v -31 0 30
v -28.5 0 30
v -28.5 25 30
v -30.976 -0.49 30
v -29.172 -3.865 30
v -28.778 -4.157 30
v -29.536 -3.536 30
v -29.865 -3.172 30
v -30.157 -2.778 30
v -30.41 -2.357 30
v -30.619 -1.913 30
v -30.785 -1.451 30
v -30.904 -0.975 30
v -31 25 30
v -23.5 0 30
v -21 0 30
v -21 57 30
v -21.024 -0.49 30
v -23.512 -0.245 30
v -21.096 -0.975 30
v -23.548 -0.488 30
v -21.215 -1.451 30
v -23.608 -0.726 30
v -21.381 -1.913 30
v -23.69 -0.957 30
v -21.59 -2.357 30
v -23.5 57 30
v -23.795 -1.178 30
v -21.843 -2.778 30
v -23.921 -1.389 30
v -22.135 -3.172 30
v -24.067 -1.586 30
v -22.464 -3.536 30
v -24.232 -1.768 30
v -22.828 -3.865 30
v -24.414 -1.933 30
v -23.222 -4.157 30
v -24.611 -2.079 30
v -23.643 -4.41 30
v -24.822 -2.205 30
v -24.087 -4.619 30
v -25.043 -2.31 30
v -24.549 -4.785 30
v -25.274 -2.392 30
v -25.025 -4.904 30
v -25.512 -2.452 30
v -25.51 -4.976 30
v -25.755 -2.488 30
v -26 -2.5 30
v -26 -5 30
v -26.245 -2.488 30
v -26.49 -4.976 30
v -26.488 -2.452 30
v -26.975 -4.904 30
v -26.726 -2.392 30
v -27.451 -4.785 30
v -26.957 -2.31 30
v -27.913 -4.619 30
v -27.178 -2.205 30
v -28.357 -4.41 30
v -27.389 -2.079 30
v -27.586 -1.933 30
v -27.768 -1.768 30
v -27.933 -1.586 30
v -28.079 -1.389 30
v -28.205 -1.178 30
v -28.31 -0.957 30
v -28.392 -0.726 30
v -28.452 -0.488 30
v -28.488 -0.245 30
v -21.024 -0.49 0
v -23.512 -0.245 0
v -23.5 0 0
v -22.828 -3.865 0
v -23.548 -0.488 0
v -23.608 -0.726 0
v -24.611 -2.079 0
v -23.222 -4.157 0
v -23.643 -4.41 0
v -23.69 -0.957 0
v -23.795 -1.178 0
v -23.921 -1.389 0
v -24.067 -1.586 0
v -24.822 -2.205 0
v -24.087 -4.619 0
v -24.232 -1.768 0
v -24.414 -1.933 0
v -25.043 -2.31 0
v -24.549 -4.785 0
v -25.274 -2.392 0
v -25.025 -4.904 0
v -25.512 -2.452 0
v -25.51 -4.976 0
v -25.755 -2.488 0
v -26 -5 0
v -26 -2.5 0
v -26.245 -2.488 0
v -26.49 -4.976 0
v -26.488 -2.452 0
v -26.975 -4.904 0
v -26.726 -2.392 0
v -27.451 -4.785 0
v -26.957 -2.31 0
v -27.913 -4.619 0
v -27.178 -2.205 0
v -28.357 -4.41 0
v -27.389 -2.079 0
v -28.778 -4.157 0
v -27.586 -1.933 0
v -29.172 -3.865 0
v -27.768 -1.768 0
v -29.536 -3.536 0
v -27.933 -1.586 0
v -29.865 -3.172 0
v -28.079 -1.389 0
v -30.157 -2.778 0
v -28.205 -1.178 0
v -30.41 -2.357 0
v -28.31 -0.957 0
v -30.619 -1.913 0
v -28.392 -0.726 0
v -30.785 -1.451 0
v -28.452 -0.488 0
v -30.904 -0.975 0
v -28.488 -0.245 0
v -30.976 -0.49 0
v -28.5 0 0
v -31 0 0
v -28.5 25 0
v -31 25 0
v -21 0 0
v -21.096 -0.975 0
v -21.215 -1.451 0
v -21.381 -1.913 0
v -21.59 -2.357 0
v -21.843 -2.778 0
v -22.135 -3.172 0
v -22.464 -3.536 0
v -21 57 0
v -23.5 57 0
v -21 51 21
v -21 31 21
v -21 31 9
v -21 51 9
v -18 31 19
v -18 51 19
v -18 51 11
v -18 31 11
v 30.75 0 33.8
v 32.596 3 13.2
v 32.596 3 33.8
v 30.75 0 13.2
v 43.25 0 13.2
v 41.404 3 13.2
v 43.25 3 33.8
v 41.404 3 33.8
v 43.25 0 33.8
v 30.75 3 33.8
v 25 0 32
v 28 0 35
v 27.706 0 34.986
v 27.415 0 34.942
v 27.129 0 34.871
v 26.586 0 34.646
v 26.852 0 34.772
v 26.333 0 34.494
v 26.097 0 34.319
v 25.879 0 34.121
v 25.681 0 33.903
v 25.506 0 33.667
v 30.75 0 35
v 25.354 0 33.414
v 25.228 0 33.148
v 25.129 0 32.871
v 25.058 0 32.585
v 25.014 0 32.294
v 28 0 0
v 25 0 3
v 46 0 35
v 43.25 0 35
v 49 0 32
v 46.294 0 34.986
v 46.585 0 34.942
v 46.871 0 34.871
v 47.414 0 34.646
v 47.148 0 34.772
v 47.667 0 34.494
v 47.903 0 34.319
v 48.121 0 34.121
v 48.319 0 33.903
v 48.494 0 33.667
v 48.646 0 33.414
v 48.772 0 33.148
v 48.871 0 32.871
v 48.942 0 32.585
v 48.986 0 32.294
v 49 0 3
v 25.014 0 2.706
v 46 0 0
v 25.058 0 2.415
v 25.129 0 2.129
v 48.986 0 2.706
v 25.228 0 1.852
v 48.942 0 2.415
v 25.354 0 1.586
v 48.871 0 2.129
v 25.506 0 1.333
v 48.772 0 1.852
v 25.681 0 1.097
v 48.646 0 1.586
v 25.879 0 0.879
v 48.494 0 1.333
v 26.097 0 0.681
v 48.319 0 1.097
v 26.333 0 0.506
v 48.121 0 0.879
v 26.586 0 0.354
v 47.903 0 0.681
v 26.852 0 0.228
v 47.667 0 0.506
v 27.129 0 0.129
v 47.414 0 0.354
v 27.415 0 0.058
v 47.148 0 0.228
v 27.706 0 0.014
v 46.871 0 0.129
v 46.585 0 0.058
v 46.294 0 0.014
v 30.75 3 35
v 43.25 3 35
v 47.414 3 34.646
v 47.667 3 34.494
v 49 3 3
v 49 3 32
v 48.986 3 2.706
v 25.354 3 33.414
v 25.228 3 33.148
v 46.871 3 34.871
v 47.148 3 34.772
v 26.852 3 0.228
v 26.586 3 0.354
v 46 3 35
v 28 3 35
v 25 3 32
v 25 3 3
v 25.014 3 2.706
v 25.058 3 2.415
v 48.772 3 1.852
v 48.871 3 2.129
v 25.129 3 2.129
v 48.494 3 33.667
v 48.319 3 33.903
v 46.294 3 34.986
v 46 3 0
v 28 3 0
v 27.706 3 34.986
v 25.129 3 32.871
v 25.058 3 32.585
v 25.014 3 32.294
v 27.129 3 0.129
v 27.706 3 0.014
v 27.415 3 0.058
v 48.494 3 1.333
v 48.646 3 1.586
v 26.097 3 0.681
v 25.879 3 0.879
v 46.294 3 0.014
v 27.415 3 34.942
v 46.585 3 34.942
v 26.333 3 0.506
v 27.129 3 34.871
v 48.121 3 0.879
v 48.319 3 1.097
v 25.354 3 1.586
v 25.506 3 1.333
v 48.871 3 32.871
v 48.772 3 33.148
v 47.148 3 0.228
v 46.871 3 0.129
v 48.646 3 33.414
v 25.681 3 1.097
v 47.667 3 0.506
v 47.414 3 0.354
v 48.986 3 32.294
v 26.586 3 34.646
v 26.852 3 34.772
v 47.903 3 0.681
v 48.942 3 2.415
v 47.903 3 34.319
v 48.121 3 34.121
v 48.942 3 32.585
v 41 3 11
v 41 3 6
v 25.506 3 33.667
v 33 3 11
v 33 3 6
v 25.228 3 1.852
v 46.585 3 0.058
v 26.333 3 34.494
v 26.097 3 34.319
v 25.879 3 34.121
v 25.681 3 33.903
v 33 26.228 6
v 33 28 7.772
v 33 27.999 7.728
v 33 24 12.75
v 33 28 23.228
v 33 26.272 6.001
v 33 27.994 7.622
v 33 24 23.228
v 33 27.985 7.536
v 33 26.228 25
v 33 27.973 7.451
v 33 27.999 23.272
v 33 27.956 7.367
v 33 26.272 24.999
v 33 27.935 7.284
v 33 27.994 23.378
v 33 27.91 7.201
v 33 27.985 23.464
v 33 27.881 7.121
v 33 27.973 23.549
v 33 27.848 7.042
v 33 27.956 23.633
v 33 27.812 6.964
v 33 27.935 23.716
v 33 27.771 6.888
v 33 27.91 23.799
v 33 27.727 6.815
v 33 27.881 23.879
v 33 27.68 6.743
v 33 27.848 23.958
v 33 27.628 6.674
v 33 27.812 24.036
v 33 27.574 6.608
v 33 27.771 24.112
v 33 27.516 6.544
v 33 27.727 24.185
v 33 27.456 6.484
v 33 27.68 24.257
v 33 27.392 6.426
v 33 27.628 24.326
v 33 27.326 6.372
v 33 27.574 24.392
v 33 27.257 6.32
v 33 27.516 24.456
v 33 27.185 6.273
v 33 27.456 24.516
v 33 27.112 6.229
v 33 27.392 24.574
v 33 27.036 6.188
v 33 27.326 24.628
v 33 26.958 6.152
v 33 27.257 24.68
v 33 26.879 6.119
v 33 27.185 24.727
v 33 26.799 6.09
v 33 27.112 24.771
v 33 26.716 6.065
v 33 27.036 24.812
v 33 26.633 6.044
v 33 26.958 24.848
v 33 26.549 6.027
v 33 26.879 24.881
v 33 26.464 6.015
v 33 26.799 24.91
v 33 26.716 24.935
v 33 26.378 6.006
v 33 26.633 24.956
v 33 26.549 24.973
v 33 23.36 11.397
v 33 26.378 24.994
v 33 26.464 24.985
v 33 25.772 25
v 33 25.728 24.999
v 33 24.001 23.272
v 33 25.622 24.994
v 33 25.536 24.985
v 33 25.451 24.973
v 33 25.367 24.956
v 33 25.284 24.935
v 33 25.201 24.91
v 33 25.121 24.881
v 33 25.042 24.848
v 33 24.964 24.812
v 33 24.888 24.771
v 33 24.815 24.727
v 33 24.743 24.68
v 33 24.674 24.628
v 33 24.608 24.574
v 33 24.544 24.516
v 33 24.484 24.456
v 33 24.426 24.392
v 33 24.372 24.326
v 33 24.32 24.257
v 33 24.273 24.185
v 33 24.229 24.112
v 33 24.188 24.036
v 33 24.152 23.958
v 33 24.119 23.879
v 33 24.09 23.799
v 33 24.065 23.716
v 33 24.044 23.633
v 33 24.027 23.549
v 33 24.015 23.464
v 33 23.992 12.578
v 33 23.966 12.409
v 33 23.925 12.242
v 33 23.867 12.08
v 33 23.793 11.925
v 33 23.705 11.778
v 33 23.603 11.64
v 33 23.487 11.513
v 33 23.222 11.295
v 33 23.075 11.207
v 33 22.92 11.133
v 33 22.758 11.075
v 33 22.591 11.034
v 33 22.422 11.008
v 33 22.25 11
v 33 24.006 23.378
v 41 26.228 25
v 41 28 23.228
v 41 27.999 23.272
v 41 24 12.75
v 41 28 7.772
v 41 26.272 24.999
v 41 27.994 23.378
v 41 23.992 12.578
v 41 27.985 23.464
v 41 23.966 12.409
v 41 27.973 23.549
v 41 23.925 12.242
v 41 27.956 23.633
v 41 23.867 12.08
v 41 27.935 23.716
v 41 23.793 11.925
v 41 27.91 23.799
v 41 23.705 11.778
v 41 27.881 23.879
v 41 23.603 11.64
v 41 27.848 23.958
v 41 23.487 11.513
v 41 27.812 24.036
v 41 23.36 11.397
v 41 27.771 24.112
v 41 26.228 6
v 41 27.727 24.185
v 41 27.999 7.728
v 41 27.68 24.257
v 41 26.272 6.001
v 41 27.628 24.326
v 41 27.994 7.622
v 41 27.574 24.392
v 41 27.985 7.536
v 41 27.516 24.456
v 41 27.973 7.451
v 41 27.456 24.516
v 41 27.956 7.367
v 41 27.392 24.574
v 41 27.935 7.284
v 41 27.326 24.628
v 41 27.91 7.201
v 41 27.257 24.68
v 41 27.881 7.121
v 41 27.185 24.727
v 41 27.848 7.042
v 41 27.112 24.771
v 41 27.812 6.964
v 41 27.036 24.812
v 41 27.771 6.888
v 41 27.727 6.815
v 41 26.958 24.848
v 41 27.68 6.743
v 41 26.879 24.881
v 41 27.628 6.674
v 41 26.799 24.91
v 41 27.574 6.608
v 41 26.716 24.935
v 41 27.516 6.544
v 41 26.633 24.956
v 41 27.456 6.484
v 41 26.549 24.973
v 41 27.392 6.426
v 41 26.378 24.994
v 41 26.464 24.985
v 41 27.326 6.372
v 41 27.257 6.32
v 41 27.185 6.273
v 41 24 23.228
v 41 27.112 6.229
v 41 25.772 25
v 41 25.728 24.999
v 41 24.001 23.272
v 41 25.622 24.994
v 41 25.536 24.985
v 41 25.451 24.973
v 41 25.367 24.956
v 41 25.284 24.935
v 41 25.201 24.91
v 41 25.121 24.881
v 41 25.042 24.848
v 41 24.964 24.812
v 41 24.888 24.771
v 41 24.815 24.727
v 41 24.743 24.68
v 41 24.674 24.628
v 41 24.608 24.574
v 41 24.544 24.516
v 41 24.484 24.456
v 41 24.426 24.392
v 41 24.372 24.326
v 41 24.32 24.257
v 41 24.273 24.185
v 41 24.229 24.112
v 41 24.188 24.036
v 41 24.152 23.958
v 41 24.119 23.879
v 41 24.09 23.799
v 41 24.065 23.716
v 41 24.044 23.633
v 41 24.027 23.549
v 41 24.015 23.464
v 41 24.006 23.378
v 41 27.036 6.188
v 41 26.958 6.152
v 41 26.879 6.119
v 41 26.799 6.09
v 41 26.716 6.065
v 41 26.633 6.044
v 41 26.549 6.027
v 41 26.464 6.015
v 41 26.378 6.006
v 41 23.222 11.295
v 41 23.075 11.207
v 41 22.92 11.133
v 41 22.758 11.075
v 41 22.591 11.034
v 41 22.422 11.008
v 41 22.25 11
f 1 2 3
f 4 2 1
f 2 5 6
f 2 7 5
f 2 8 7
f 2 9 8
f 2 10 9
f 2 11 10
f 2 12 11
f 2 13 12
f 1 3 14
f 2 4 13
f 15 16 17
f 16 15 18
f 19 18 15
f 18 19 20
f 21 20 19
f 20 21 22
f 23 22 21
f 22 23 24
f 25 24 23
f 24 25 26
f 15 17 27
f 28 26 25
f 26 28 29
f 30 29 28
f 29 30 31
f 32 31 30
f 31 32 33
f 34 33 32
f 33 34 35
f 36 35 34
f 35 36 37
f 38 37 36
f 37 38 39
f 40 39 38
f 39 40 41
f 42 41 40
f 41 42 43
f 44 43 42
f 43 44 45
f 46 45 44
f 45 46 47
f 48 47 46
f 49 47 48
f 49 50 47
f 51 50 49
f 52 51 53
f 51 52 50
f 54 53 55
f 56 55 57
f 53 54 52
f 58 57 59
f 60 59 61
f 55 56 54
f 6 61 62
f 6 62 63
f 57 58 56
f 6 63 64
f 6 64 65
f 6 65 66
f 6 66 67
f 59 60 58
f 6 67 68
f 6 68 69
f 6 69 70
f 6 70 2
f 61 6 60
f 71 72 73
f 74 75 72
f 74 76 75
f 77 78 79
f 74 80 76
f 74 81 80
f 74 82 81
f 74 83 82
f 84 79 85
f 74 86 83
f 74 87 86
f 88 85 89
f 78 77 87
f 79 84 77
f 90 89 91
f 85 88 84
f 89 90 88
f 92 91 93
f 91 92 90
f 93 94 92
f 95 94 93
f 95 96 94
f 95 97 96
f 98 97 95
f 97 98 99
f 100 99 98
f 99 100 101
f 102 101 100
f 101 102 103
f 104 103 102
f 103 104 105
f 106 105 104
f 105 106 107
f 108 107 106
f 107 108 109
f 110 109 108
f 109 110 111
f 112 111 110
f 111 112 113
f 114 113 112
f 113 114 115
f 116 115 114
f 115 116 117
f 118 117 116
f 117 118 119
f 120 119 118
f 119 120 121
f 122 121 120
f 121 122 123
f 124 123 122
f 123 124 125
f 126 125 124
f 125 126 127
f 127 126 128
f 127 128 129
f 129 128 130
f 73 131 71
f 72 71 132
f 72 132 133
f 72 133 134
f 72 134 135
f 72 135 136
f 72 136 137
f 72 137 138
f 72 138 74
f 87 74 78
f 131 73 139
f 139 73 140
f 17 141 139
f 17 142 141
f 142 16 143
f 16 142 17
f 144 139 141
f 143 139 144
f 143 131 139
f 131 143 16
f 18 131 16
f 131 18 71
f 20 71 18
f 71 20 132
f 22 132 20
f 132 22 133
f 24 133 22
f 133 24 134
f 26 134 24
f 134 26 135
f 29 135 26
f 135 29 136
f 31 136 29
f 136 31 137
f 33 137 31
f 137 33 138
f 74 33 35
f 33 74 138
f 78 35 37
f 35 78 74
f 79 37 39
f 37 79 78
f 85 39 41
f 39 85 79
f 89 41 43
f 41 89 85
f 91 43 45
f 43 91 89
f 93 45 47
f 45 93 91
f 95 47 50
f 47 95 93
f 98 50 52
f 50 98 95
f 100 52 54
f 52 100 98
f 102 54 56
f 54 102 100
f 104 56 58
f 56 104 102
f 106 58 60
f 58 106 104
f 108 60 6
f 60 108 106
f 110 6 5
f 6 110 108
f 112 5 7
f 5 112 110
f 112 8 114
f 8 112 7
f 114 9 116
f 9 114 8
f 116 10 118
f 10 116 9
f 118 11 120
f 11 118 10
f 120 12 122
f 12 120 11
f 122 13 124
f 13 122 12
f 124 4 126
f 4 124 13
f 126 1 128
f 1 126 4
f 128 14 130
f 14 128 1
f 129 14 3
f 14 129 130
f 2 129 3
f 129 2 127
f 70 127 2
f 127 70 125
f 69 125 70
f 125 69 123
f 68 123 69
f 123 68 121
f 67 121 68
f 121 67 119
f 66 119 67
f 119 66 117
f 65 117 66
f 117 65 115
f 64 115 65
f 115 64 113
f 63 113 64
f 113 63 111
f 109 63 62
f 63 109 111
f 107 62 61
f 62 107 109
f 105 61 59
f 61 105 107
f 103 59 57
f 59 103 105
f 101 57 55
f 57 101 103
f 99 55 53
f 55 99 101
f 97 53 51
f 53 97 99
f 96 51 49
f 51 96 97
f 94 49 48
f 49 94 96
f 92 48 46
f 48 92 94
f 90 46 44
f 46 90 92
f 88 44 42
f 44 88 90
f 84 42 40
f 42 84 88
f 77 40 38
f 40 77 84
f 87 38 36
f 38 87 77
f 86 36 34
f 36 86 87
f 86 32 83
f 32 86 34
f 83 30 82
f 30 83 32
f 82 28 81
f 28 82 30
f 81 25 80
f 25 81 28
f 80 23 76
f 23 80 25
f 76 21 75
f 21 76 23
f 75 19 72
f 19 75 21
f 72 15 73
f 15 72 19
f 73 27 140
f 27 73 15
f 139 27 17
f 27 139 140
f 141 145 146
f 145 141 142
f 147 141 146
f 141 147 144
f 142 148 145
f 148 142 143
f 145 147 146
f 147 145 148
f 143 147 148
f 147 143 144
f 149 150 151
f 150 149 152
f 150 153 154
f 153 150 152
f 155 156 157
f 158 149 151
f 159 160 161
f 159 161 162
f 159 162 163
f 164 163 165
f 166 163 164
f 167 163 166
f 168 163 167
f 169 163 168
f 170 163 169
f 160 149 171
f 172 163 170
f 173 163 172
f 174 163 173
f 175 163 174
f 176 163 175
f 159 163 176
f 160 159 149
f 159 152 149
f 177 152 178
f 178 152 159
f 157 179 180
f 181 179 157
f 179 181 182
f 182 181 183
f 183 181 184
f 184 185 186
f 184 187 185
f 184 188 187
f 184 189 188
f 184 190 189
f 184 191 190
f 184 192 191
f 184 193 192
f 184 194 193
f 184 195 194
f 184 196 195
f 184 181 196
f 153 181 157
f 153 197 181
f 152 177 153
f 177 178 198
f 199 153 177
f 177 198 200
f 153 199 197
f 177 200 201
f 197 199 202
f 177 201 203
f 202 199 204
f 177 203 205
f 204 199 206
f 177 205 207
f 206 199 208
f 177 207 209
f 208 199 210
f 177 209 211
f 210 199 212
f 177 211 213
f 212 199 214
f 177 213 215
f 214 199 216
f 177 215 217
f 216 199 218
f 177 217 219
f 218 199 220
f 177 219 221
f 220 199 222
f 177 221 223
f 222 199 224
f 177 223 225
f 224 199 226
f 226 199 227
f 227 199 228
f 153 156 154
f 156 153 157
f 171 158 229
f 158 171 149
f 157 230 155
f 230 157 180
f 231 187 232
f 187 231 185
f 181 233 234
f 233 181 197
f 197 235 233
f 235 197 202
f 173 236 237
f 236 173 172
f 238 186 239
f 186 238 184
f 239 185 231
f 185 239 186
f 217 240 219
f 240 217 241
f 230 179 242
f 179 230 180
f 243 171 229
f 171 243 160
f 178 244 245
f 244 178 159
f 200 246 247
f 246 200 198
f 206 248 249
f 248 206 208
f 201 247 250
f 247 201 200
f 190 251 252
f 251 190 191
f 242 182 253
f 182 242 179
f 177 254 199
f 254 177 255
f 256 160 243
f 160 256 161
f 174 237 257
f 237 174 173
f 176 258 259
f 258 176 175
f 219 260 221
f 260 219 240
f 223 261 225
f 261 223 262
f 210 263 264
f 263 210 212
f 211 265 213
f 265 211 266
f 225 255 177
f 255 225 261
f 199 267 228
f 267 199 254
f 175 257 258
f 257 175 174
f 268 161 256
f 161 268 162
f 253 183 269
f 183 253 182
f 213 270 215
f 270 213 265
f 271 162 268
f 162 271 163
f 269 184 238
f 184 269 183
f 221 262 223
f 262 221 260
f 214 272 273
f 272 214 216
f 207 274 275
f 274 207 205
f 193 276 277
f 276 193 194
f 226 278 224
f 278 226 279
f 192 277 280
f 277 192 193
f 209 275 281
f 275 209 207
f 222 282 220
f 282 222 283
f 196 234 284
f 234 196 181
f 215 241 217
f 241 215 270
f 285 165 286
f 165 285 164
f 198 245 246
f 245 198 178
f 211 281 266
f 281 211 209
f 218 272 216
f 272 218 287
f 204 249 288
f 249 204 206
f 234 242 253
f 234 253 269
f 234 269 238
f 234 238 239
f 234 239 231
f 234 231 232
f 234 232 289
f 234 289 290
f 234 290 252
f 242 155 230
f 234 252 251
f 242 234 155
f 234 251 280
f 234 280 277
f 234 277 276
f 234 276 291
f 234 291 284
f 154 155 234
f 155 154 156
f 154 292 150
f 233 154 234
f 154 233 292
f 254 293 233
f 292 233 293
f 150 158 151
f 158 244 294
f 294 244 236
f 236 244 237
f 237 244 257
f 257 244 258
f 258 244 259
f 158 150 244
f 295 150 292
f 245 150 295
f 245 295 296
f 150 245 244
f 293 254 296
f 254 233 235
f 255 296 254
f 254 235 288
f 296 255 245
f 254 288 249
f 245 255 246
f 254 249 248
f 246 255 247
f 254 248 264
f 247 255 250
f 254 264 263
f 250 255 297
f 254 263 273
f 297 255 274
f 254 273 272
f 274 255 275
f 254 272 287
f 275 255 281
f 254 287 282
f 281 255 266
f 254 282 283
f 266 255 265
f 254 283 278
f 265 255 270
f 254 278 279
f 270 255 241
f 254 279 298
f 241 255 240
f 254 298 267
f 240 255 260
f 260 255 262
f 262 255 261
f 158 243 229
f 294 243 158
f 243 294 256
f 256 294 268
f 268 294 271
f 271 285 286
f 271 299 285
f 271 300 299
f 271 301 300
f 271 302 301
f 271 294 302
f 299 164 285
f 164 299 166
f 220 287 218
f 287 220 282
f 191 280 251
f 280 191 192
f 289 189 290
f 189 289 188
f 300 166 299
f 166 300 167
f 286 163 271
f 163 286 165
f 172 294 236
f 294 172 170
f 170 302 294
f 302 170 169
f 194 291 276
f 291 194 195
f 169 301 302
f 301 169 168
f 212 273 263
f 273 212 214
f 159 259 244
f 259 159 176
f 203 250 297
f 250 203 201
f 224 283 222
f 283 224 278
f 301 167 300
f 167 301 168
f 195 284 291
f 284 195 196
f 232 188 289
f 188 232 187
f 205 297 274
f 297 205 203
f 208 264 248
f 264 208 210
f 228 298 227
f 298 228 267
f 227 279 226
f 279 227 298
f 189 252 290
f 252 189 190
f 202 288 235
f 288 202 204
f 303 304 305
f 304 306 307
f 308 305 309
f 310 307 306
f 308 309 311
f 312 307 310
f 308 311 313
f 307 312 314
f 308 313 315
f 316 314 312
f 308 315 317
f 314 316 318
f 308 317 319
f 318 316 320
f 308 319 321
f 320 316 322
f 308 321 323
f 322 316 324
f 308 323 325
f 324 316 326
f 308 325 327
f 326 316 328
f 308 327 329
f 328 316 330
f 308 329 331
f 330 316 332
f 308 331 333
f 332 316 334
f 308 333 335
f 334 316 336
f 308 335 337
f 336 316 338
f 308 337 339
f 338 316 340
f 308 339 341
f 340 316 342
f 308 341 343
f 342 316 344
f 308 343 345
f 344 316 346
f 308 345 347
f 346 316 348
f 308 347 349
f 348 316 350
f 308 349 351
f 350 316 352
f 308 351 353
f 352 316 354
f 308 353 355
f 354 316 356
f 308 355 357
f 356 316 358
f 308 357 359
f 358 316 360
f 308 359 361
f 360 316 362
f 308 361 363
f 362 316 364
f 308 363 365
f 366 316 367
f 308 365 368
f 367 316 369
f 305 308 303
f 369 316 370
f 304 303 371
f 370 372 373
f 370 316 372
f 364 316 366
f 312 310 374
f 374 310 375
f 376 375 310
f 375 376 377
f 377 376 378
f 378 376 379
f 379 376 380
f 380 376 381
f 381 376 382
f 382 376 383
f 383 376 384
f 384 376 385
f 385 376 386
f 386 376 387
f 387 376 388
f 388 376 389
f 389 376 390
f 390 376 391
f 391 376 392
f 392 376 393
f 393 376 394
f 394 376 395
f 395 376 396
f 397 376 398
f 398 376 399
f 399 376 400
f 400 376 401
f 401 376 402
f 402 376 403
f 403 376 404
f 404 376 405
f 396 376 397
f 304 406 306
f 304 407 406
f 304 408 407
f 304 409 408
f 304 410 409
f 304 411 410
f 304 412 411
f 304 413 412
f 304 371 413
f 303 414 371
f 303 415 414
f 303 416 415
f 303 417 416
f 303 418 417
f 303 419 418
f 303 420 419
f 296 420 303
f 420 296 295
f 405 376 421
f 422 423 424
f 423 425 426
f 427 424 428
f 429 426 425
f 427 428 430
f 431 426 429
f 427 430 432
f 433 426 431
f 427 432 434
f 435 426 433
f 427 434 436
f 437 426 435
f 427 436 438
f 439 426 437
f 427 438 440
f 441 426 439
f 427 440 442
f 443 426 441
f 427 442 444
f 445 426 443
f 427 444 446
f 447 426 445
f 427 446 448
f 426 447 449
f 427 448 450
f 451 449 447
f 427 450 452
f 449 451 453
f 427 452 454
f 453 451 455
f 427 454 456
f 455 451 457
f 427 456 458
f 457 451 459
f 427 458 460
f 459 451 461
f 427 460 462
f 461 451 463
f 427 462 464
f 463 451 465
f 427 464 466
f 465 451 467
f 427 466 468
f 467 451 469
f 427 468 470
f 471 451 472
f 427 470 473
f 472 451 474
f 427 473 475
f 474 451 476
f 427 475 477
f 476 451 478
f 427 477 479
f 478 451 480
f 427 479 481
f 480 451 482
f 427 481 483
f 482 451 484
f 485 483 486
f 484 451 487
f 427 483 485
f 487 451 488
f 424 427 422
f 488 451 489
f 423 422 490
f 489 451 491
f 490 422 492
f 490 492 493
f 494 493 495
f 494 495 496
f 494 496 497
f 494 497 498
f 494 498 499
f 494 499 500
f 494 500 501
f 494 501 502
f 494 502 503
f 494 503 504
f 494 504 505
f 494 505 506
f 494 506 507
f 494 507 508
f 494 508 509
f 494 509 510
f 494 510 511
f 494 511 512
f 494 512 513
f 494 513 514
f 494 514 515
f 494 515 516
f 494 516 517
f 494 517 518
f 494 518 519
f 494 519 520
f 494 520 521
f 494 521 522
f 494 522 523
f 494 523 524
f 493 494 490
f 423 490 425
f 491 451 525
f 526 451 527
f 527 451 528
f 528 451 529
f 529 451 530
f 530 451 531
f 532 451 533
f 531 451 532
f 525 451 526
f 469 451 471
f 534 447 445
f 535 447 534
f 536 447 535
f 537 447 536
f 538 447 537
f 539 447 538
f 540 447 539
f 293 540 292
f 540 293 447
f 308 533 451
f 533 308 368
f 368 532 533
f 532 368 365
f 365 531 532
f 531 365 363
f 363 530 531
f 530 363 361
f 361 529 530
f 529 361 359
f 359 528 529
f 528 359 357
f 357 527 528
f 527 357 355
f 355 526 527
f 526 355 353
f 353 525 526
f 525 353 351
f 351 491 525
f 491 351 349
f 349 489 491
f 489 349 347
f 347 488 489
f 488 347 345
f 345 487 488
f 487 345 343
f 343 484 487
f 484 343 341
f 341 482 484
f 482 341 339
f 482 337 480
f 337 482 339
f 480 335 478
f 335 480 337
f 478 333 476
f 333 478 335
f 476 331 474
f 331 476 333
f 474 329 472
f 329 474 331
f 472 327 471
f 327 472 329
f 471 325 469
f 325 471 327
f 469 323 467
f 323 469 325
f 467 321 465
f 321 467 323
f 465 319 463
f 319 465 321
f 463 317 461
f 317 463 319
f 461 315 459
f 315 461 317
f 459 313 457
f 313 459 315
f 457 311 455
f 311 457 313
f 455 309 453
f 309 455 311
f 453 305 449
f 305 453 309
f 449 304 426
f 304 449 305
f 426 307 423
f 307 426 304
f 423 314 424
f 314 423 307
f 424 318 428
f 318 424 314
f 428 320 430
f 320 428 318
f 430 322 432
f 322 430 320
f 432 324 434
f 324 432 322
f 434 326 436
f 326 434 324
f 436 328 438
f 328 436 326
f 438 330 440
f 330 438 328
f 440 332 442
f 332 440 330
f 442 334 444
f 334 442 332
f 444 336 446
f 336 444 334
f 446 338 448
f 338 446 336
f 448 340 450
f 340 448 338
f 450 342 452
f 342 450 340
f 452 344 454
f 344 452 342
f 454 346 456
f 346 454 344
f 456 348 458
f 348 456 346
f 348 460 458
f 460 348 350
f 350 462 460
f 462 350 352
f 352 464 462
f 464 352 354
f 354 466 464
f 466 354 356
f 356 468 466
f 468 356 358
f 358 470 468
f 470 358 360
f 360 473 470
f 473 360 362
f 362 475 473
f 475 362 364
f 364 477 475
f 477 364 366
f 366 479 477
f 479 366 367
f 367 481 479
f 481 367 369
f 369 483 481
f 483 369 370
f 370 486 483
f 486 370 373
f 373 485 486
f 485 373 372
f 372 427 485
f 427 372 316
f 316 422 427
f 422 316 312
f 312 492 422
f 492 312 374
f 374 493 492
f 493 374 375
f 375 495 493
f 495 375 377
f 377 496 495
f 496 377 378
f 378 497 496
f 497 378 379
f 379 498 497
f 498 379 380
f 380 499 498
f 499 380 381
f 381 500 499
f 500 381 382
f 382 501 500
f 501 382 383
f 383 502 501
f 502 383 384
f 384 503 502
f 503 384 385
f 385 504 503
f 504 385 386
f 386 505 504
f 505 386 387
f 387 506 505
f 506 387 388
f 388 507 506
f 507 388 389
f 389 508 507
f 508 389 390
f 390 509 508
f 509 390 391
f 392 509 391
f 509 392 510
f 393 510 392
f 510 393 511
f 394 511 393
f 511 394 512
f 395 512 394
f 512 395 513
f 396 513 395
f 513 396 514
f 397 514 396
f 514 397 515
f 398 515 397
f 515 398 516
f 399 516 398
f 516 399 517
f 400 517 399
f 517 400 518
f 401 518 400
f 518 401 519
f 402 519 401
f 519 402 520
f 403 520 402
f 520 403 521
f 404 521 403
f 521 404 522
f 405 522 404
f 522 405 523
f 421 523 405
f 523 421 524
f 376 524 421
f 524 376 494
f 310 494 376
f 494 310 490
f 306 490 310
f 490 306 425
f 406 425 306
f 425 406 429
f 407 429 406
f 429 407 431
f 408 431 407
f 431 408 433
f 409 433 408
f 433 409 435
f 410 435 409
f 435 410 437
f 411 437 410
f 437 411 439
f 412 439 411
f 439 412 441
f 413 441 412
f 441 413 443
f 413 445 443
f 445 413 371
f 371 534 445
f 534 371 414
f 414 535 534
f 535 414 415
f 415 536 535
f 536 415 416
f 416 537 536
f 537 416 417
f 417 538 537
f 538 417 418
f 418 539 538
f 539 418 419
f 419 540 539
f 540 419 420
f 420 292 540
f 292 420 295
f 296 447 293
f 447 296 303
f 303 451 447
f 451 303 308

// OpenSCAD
// modular-clip-hook — L-style hook accessory that slides onto a
// modular-clip via the shared dovetail interface. Use it for cables,
// keys, headphones, small bags, etc.
// Author: John Mylchreest <jmylchreest@gmail.com>. MIT licensed.

use <../../libraries/modular-clip/modular-clip.scad>

/* [Output] */
render_target = "all";  // [clip, hook, all]

/* [Clip — grips the edge] */
clip_grip_d     = 5;
clip_grip_h     = 25;
clip_width      = 30;
clip_wall_t     = 2.5;
clip_top_r      = 2.0;
clip_arm_extend = 32;   // ≥ CLIP_DOVETAIL_L + 2 mm so the slot fits

/* [Hook back plate] */
plate_w     = 24;   // X width of the back plate
plate_h     = 35;   // Z height — covers the rail at the top + the hook anchor below
plate_t     = 3;    // Y thickness behind the rail
plate_r     = 3;    // outer corner radius (cosmetic)

/* [Hook] */
hook_w        = 8;     // X width of the hook itself
hook_shaft_l  = 28;    // Y extent of the horizontal shaft (out from the back plate)
hook_shaft_t  = 5;     // Z thickness of the horizontal shaft
hook_tip_h    = 14;    // Z height of the upturned tip
hook_tip_t    = 4;     // Y thickness of the upturned tip
hook_fillet   = 2.5;   // corner-rounding radius on the 2D hook profile
hook_z_offset = 6;     // Z offset from the bottom of the plate to the hook bottom

/* [Quality] */
$fa = $preview ? $fa : 1;
$fs = $preview ? $fs : 0.2;
$fn = 64;

/* [Layout — `render_target = all` only] */
all_spacing = 25;

// ---- modules ----

// 2D side profile of the L-hook in the YZ plane. Origin at the corner
// where the shaft meets the back plate; +Y forward, +Z upward.
// Fillet is clamped to (shaft thickness − 0.5 mm) / 2 so the offsets
// don't erode away thin features when the user asks for a large fillet.
module _hook_profile_2d() {
    f = min(hook_fillet,
            (min(hook_shaft_t, hook_tip_t) - 0.5) / 2);
    offset(r = -f) offset(r = f)
        offset(r = f) offset(r = -f)
            polygon([
                [0,                       0],
                [hook_shaft_l,            0],
                [hook_shaft_l,            hook_shaft_t + hook_tip_h],
                [hook_shaft_l - hook_tip_t, hook_shaft_t + hook_tip_h],
                [hook_shaft_l - hook_tip_t, hook_shaft_t],
                [0,                       hook_shaft_t],
            ]);
}

// L-hook attached to the front face of the back plate (which sits at Y=0
// in the new male-connector frame). Shaft sticks out in +Y; vertical tip
// at the end of the shaft points up in +Z.
module hook_body() {
    translate([0, 0, hook_z_offset])
        rotate([90, 0, 90])
            linear_extrude(height = hook_w, center = true)
                _hook_profile_2d();
}

// Full hook = back plate (with male rail on its back) + hook body in front.
module hook() {
    union() {
        modular_holder_back(width    = plate_w,
                            height   = plate_h,
                            wall_t   = plate_t,
                            corner_r = plate_r);
        hook_body();
    }
}

// Clip dropped onto its side and shifted so its lowest Z is at Z=0 —
// the whole side profile rests on the bed for a low-support print.
module _printable_clip() {
    translate([0, 0, clip_width / 2])
        rotate([90, 0, 0])
            clip(grip_d = clip_grip_d, grip_h = clip_grip_h,
                 width = clip_width, wall_t = clip_wall_t,
                 top_r = clip_top_r, arm_extend = clip_arm_extend);
}

// ---- output ----
if (render_target == "clip") {
    _printable_clip();
} else if (render_target == "hook") {
    hook();
} else if (render_target == "all") {
    // Both parts sit with their lowest face at Z=0 (the bed). Clip on
    // the left (laid flat), hook on the right (standing upright on its
    // back plate base).
    clip_x_w = clip_top_r + clip_wall_t * 2 + clip_grip_d;
    translate([-all_spacing - clip_x_w / 2, 0, 0])
        _printable_clip();
    translate([all_spacing + plate_w / 2, 0, 0])
        hook();
}
